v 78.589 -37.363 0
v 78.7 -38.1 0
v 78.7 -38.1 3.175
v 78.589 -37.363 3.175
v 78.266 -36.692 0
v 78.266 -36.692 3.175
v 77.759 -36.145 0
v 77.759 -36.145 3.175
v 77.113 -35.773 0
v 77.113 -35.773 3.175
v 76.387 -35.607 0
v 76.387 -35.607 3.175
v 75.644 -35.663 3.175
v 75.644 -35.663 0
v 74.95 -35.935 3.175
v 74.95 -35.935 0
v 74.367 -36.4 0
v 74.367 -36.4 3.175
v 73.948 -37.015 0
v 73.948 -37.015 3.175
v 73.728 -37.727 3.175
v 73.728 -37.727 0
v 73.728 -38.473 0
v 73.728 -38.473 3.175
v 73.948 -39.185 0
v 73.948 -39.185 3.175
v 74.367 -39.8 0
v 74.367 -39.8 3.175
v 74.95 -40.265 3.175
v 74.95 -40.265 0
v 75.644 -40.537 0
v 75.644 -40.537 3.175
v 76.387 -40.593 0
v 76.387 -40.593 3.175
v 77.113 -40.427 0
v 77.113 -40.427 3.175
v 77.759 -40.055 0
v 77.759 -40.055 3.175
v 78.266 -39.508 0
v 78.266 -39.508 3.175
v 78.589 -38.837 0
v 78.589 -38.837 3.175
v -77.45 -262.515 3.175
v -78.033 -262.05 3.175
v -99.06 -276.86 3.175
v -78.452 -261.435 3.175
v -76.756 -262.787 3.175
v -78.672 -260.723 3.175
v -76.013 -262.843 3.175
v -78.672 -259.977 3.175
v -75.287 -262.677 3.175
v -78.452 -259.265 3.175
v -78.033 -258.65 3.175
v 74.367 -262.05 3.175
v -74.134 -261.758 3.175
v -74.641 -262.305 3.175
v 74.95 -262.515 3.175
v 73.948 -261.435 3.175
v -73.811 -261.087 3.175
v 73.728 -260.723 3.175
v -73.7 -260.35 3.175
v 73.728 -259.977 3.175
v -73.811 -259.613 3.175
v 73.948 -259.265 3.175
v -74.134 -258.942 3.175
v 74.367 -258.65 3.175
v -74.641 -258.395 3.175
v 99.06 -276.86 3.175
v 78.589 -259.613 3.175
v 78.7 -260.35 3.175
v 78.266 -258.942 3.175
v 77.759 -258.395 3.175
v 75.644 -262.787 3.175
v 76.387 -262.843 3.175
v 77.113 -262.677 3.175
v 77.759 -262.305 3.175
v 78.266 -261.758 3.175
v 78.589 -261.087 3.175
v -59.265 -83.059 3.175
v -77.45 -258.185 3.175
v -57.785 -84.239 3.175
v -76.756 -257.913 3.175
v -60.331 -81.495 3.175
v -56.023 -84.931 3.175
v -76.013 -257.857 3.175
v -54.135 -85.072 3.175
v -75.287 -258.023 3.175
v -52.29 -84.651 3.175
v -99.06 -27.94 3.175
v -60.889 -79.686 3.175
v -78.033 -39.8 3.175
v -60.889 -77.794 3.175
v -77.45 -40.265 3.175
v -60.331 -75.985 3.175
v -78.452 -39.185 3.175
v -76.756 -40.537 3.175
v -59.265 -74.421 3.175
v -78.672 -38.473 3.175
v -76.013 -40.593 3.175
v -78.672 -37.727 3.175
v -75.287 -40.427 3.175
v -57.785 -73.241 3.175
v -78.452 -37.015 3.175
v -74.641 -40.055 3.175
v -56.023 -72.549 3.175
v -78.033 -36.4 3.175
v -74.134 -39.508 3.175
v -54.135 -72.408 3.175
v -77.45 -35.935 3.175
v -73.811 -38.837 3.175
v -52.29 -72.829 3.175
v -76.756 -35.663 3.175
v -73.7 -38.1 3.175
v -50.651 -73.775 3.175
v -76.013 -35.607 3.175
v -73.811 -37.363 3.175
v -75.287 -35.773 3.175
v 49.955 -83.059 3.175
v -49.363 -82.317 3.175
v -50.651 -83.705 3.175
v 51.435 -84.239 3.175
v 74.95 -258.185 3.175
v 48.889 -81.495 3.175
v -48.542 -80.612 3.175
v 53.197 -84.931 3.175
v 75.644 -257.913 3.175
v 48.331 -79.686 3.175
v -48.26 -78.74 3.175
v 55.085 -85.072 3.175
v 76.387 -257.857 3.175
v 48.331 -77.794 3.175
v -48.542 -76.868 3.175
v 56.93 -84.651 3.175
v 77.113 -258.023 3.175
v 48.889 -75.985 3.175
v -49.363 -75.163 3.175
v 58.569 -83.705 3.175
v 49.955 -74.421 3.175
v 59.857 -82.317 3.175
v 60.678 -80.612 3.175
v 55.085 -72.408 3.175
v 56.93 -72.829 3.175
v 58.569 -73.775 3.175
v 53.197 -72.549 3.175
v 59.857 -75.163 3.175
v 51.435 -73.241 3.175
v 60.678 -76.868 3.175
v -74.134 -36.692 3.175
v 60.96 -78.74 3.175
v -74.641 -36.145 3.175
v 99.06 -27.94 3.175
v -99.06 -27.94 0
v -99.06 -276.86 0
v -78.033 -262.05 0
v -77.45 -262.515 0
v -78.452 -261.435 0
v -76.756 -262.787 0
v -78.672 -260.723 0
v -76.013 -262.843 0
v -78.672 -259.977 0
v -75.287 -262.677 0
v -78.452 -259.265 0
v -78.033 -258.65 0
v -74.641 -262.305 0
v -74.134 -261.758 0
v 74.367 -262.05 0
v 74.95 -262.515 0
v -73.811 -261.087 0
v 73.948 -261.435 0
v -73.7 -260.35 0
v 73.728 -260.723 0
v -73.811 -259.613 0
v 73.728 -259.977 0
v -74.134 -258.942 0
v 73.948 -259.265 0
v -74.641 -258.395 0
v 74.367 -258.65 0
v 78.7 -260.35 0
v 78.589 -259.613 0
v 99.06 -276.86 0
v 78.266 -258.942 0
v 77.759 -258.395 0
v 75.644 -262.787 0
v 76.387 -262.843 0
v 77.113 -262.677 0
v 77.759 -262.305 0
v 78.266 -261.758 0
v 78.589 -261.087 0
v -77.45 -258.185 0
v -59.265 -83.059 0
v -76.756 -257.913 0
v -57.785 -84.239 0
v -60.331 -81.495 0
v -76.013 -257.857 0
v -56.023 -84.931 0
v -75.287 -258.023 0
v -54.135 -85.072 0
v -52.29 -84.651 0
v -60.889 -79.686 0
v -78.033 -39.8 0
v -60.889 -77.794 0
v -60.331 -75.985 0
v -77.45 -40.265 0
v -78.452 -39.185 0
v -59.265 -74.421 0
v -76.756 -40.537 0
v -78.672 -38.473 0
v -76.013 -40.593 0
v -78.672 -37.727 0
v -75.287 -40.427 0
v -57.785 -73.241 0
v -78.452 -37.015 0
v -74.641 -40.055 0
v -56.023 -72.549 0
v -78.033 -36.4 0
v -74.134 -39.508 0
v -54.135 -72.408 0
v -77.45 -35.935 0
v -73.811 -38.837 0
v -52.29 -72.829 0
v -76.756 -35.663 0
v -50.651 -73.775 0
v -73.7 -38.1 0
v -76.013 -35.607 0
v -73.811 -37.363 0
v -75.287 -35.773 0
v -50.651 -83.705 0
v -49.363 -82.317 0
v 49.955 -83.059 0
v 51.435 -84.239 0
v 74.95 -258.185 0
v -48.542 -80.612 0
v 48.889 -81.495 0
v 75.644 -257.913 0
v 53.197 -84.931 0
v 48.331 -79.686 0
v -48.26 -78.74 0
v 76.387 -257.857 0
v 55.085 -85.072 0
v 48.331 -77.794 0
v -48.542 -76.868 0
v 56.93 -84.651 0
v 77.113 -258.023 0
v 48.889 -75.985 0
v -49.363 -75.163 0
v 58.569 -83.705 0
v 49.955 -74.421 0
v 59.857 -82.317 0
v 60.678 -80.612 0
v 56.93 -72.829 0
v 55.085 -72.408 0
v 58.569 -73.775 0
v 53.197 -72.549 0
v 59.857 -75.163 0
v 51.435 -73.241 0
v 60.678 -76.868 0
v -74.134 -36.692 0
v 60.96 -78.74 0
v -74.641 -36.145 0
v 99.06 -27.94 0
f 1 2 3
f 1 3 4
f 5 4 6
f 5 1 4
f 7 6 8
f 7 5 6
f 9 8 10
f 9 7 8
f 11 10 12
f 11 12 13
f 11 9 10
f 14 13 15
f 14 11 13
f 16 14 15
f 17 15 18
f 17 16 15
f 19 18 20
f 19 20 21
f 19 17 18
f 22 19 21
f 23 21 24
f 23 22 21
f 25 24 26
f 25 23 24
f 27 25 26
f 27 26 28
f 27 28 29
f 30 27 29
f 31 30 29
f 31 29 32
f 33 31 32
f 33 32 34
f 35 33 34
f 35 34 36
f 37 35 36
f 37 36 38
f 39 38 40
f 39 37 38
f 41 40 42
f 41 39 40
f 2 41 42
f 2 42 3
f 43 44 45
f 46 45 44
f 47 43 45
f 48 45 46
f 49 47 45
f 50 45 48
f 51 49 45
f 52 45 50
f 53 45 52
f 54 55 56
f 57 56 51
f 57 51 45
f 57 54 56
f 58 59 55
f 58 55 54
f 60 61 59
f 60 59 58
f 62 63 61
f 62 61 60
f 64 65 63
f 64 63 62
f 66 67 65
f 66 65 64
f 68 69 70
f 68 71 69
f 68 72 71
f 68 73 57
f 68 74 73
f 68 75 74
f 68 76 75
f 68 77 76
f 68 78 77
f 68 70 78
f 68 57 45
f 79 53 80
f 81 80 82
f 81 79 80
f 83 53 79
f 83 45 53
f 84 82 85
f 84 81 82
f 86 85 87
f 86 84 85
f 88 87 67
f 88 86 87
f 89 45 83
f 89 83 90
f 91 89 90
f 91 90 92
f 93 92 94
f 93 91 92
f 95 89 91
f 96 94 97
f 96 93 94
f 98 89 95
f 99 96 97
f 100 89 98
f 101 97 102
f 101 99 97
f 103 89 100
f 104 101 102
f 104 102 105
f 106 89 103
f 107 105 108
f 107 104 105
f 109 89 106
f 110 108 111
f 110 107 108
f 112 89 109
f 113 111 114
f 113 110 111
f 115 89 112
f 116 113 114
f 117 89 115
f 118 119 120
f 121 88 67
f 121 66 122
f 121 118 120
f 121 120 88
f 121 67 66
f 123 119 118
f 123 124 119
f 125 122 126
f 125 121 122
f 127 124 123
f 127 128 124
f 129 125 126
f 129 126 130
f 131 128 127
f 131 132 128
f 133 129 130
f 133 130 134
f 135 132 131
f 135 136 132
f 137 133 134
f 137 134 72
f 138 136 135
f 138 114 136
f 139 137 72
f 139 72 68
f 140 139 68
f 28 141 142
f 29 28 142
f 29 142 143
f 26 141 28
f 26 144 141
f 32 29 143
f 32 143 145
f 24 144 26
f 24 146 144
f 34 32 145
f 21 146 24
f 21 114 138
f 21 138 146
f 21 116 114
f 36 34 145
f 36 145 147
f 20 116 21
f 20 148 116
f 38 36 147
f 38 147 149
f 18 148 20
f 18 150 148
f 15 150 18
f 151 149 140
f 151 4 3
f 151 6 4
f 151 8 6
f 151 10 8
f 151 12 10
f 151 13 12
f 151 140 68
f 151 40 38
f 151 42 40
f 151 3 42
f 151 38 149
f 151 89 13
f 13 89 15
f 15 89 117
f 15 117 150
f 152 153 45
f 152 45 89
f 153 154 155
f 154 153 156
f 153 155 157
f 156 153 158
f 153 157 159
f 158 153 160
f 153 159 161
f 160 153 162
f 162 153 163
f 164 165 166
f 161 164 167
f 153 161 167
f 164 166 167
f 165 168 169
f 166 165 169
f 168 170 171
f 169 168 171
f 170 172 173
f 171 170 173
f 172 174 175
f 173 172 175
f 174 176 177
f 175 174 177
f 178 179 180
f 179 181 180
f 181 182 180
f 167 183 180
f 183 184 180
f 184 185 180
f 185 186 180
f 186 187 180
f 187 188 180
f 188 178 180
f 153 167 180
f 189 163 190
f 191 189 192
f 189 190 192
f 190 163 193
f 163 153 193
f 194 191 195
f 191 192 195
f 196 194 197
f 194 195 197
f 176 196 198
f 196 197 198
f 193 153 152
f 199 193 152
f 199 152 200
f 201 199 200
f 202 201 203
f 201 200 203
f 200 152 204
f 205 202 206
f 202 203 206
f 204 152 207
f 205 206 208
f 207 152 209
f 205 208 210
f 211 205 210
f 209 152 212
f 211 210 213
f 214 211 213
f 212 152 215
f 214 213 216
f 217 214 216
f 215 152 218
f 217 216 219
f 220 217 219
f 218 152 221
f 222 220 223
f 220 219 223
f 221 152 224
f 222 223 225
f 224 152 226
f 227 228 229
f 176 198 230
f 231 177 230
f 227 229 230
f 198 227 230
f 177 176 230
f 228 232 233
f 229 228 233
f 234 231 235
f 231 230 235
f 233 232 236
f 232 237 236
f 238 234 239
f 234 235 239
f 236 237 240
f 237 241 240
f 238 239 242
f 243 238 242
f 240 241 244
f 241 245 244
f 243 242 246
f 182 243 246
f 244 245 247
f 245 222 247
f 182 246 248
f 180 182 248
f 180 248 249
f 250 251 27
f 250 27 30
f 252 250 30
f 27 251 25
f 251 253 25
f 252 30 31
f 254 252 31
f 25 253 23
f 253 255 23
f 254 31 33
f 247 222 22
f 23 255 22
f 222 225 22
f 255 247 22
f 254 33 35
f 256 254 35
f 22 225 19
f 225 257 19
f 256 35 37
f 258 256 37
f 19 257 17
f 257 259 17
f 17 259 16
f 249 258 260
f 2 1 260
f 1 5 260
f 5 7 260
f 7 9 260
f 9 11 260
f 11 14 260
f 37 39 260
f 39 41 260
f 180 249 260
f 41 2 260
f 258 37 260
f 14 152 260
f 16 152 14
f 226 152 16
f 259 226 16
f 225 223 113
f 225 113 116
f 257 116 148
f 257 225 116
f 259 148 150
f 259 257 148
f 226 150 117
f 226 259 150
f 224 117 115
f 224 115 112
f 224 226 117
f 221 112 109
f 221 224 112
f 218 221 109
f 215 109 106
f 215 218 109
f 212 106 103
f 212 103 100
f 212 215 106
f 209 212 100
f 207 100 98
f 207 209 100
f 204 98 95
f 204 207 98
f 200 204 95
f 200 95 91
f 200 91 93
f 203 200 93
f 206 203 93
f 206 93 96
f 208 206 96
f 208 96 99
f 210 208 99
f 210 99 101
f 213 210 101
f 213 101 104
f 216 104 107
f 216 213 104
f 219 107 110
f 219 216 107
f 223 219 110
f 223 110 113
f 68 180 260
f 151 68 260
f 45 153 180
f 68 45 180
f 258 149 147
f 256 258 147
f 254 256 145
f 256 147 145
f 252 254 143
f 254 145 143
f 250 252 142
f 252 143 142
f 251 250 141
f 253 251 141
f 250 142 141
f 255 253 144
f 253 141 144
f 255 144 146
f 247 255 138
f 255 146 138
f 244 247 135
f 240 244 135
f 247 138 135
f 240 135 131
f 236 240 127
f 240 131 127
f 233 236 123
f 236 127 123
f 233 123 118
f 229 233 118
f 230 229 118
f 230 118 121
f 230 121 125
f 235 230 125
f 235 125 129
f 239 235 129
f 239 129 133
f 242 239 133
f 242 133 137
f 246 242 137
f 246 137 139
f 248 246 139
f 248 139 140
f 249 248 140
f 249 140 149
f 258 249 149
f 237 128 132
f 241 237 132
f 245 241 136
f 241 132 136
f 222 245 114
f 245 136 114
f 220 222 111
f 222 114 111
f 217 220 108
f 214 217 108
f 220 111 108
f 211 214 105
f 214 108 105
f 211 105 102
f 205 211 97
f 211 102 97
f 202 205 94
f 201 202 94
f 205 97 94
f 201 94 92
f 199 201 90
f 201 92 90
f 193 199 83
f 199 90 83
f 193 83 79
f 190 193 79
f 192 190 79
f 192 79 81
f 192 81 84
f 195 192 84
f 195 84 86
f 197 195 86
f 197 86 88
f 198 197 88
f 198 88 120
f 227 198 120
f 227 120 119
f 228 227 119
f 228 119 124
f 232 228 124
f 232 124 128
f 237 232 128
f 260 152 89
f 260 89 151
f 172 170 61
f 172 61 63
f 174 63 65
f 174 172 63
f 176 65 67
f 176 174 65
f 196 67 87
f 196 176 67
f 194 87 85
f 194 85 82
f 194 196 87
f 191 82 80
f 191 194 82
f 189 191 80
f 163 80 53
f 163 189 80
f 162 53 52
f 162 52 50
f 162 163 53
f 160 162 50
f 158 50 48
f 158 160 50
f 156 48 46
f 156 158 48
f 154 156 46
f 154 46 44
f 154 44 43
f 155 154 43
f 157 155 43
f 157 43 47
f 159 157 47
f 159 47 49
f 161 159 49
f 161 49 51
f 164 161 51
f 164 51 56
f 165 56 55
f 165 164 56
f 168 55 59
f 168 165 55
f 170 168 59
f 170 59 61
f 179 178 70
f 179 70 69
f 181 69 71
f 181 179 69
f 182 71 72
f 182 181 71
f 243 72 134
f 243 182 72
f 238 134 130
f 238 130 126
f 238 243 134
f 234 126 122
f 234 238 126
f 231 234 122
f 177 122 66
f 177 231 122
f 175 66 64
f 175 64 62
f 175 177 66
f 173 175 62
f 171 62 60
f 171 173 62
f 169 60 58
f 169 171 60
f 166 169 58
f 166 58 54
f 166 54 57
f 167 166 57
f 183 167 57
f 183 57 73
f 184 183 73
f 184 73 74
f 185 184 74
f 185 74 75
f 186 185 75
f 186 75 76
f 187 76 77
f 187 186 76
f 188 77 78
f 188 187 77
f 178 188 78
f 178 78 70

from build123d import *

# Parameters (mm, degrees)
SKETCH1_W           = 198.12
SKETCH1_H           = 248.92
SKETCH1_R           = 2.5
BOSS_EXTRUDE1_DEPTH = 3.175
SKETCH2_R           = 6.35
CUT_EXTRUDE1_DEPTH  = 4.175


with BuildPart() as part:
    # Sketch1 → Boss-Extrude1 (new body)
    with BuildSketch(Plane.XY):
        with Locations((0, -152.4)):
            Rectangle(SKETCH1_W, SKETCH1_H)
        with Locations((-76.2, -260.35)):
            Circle(SKETCH1_R, mode=Mode.SUBTRACT)
        with Locations((-76.2, -38.1)):
            Circle(SKETCH1_R, mode=Mode.SUBTRACT)
        with Locations((76.2, -38.1)):
            Circle(SKETCH1_R, mode=Mode.SUBTRACT)
        with Locations((76.2, -260.35)):
            Circle(SKETCH1_R, mode=Mode.SUBTRACT)
    extrude(amount=BOSS_EXTRUDE1_DEPTH)

    # Sketch2 → Cut-Extrude1 (cut, through all)
    with BuildSketch(Plane.XY.offset(3.175)):
        with Locations((-54.61, -78.74)):
            Circle(SKETCH2_R)
        with Locations((54.61, -78.74)):
            Circle(SKETCH2_R)
    extrude(amount=-CUT_EXTRUDE1_DEPTH, mode=Mode.SUBTRACT)


solid = part.part
